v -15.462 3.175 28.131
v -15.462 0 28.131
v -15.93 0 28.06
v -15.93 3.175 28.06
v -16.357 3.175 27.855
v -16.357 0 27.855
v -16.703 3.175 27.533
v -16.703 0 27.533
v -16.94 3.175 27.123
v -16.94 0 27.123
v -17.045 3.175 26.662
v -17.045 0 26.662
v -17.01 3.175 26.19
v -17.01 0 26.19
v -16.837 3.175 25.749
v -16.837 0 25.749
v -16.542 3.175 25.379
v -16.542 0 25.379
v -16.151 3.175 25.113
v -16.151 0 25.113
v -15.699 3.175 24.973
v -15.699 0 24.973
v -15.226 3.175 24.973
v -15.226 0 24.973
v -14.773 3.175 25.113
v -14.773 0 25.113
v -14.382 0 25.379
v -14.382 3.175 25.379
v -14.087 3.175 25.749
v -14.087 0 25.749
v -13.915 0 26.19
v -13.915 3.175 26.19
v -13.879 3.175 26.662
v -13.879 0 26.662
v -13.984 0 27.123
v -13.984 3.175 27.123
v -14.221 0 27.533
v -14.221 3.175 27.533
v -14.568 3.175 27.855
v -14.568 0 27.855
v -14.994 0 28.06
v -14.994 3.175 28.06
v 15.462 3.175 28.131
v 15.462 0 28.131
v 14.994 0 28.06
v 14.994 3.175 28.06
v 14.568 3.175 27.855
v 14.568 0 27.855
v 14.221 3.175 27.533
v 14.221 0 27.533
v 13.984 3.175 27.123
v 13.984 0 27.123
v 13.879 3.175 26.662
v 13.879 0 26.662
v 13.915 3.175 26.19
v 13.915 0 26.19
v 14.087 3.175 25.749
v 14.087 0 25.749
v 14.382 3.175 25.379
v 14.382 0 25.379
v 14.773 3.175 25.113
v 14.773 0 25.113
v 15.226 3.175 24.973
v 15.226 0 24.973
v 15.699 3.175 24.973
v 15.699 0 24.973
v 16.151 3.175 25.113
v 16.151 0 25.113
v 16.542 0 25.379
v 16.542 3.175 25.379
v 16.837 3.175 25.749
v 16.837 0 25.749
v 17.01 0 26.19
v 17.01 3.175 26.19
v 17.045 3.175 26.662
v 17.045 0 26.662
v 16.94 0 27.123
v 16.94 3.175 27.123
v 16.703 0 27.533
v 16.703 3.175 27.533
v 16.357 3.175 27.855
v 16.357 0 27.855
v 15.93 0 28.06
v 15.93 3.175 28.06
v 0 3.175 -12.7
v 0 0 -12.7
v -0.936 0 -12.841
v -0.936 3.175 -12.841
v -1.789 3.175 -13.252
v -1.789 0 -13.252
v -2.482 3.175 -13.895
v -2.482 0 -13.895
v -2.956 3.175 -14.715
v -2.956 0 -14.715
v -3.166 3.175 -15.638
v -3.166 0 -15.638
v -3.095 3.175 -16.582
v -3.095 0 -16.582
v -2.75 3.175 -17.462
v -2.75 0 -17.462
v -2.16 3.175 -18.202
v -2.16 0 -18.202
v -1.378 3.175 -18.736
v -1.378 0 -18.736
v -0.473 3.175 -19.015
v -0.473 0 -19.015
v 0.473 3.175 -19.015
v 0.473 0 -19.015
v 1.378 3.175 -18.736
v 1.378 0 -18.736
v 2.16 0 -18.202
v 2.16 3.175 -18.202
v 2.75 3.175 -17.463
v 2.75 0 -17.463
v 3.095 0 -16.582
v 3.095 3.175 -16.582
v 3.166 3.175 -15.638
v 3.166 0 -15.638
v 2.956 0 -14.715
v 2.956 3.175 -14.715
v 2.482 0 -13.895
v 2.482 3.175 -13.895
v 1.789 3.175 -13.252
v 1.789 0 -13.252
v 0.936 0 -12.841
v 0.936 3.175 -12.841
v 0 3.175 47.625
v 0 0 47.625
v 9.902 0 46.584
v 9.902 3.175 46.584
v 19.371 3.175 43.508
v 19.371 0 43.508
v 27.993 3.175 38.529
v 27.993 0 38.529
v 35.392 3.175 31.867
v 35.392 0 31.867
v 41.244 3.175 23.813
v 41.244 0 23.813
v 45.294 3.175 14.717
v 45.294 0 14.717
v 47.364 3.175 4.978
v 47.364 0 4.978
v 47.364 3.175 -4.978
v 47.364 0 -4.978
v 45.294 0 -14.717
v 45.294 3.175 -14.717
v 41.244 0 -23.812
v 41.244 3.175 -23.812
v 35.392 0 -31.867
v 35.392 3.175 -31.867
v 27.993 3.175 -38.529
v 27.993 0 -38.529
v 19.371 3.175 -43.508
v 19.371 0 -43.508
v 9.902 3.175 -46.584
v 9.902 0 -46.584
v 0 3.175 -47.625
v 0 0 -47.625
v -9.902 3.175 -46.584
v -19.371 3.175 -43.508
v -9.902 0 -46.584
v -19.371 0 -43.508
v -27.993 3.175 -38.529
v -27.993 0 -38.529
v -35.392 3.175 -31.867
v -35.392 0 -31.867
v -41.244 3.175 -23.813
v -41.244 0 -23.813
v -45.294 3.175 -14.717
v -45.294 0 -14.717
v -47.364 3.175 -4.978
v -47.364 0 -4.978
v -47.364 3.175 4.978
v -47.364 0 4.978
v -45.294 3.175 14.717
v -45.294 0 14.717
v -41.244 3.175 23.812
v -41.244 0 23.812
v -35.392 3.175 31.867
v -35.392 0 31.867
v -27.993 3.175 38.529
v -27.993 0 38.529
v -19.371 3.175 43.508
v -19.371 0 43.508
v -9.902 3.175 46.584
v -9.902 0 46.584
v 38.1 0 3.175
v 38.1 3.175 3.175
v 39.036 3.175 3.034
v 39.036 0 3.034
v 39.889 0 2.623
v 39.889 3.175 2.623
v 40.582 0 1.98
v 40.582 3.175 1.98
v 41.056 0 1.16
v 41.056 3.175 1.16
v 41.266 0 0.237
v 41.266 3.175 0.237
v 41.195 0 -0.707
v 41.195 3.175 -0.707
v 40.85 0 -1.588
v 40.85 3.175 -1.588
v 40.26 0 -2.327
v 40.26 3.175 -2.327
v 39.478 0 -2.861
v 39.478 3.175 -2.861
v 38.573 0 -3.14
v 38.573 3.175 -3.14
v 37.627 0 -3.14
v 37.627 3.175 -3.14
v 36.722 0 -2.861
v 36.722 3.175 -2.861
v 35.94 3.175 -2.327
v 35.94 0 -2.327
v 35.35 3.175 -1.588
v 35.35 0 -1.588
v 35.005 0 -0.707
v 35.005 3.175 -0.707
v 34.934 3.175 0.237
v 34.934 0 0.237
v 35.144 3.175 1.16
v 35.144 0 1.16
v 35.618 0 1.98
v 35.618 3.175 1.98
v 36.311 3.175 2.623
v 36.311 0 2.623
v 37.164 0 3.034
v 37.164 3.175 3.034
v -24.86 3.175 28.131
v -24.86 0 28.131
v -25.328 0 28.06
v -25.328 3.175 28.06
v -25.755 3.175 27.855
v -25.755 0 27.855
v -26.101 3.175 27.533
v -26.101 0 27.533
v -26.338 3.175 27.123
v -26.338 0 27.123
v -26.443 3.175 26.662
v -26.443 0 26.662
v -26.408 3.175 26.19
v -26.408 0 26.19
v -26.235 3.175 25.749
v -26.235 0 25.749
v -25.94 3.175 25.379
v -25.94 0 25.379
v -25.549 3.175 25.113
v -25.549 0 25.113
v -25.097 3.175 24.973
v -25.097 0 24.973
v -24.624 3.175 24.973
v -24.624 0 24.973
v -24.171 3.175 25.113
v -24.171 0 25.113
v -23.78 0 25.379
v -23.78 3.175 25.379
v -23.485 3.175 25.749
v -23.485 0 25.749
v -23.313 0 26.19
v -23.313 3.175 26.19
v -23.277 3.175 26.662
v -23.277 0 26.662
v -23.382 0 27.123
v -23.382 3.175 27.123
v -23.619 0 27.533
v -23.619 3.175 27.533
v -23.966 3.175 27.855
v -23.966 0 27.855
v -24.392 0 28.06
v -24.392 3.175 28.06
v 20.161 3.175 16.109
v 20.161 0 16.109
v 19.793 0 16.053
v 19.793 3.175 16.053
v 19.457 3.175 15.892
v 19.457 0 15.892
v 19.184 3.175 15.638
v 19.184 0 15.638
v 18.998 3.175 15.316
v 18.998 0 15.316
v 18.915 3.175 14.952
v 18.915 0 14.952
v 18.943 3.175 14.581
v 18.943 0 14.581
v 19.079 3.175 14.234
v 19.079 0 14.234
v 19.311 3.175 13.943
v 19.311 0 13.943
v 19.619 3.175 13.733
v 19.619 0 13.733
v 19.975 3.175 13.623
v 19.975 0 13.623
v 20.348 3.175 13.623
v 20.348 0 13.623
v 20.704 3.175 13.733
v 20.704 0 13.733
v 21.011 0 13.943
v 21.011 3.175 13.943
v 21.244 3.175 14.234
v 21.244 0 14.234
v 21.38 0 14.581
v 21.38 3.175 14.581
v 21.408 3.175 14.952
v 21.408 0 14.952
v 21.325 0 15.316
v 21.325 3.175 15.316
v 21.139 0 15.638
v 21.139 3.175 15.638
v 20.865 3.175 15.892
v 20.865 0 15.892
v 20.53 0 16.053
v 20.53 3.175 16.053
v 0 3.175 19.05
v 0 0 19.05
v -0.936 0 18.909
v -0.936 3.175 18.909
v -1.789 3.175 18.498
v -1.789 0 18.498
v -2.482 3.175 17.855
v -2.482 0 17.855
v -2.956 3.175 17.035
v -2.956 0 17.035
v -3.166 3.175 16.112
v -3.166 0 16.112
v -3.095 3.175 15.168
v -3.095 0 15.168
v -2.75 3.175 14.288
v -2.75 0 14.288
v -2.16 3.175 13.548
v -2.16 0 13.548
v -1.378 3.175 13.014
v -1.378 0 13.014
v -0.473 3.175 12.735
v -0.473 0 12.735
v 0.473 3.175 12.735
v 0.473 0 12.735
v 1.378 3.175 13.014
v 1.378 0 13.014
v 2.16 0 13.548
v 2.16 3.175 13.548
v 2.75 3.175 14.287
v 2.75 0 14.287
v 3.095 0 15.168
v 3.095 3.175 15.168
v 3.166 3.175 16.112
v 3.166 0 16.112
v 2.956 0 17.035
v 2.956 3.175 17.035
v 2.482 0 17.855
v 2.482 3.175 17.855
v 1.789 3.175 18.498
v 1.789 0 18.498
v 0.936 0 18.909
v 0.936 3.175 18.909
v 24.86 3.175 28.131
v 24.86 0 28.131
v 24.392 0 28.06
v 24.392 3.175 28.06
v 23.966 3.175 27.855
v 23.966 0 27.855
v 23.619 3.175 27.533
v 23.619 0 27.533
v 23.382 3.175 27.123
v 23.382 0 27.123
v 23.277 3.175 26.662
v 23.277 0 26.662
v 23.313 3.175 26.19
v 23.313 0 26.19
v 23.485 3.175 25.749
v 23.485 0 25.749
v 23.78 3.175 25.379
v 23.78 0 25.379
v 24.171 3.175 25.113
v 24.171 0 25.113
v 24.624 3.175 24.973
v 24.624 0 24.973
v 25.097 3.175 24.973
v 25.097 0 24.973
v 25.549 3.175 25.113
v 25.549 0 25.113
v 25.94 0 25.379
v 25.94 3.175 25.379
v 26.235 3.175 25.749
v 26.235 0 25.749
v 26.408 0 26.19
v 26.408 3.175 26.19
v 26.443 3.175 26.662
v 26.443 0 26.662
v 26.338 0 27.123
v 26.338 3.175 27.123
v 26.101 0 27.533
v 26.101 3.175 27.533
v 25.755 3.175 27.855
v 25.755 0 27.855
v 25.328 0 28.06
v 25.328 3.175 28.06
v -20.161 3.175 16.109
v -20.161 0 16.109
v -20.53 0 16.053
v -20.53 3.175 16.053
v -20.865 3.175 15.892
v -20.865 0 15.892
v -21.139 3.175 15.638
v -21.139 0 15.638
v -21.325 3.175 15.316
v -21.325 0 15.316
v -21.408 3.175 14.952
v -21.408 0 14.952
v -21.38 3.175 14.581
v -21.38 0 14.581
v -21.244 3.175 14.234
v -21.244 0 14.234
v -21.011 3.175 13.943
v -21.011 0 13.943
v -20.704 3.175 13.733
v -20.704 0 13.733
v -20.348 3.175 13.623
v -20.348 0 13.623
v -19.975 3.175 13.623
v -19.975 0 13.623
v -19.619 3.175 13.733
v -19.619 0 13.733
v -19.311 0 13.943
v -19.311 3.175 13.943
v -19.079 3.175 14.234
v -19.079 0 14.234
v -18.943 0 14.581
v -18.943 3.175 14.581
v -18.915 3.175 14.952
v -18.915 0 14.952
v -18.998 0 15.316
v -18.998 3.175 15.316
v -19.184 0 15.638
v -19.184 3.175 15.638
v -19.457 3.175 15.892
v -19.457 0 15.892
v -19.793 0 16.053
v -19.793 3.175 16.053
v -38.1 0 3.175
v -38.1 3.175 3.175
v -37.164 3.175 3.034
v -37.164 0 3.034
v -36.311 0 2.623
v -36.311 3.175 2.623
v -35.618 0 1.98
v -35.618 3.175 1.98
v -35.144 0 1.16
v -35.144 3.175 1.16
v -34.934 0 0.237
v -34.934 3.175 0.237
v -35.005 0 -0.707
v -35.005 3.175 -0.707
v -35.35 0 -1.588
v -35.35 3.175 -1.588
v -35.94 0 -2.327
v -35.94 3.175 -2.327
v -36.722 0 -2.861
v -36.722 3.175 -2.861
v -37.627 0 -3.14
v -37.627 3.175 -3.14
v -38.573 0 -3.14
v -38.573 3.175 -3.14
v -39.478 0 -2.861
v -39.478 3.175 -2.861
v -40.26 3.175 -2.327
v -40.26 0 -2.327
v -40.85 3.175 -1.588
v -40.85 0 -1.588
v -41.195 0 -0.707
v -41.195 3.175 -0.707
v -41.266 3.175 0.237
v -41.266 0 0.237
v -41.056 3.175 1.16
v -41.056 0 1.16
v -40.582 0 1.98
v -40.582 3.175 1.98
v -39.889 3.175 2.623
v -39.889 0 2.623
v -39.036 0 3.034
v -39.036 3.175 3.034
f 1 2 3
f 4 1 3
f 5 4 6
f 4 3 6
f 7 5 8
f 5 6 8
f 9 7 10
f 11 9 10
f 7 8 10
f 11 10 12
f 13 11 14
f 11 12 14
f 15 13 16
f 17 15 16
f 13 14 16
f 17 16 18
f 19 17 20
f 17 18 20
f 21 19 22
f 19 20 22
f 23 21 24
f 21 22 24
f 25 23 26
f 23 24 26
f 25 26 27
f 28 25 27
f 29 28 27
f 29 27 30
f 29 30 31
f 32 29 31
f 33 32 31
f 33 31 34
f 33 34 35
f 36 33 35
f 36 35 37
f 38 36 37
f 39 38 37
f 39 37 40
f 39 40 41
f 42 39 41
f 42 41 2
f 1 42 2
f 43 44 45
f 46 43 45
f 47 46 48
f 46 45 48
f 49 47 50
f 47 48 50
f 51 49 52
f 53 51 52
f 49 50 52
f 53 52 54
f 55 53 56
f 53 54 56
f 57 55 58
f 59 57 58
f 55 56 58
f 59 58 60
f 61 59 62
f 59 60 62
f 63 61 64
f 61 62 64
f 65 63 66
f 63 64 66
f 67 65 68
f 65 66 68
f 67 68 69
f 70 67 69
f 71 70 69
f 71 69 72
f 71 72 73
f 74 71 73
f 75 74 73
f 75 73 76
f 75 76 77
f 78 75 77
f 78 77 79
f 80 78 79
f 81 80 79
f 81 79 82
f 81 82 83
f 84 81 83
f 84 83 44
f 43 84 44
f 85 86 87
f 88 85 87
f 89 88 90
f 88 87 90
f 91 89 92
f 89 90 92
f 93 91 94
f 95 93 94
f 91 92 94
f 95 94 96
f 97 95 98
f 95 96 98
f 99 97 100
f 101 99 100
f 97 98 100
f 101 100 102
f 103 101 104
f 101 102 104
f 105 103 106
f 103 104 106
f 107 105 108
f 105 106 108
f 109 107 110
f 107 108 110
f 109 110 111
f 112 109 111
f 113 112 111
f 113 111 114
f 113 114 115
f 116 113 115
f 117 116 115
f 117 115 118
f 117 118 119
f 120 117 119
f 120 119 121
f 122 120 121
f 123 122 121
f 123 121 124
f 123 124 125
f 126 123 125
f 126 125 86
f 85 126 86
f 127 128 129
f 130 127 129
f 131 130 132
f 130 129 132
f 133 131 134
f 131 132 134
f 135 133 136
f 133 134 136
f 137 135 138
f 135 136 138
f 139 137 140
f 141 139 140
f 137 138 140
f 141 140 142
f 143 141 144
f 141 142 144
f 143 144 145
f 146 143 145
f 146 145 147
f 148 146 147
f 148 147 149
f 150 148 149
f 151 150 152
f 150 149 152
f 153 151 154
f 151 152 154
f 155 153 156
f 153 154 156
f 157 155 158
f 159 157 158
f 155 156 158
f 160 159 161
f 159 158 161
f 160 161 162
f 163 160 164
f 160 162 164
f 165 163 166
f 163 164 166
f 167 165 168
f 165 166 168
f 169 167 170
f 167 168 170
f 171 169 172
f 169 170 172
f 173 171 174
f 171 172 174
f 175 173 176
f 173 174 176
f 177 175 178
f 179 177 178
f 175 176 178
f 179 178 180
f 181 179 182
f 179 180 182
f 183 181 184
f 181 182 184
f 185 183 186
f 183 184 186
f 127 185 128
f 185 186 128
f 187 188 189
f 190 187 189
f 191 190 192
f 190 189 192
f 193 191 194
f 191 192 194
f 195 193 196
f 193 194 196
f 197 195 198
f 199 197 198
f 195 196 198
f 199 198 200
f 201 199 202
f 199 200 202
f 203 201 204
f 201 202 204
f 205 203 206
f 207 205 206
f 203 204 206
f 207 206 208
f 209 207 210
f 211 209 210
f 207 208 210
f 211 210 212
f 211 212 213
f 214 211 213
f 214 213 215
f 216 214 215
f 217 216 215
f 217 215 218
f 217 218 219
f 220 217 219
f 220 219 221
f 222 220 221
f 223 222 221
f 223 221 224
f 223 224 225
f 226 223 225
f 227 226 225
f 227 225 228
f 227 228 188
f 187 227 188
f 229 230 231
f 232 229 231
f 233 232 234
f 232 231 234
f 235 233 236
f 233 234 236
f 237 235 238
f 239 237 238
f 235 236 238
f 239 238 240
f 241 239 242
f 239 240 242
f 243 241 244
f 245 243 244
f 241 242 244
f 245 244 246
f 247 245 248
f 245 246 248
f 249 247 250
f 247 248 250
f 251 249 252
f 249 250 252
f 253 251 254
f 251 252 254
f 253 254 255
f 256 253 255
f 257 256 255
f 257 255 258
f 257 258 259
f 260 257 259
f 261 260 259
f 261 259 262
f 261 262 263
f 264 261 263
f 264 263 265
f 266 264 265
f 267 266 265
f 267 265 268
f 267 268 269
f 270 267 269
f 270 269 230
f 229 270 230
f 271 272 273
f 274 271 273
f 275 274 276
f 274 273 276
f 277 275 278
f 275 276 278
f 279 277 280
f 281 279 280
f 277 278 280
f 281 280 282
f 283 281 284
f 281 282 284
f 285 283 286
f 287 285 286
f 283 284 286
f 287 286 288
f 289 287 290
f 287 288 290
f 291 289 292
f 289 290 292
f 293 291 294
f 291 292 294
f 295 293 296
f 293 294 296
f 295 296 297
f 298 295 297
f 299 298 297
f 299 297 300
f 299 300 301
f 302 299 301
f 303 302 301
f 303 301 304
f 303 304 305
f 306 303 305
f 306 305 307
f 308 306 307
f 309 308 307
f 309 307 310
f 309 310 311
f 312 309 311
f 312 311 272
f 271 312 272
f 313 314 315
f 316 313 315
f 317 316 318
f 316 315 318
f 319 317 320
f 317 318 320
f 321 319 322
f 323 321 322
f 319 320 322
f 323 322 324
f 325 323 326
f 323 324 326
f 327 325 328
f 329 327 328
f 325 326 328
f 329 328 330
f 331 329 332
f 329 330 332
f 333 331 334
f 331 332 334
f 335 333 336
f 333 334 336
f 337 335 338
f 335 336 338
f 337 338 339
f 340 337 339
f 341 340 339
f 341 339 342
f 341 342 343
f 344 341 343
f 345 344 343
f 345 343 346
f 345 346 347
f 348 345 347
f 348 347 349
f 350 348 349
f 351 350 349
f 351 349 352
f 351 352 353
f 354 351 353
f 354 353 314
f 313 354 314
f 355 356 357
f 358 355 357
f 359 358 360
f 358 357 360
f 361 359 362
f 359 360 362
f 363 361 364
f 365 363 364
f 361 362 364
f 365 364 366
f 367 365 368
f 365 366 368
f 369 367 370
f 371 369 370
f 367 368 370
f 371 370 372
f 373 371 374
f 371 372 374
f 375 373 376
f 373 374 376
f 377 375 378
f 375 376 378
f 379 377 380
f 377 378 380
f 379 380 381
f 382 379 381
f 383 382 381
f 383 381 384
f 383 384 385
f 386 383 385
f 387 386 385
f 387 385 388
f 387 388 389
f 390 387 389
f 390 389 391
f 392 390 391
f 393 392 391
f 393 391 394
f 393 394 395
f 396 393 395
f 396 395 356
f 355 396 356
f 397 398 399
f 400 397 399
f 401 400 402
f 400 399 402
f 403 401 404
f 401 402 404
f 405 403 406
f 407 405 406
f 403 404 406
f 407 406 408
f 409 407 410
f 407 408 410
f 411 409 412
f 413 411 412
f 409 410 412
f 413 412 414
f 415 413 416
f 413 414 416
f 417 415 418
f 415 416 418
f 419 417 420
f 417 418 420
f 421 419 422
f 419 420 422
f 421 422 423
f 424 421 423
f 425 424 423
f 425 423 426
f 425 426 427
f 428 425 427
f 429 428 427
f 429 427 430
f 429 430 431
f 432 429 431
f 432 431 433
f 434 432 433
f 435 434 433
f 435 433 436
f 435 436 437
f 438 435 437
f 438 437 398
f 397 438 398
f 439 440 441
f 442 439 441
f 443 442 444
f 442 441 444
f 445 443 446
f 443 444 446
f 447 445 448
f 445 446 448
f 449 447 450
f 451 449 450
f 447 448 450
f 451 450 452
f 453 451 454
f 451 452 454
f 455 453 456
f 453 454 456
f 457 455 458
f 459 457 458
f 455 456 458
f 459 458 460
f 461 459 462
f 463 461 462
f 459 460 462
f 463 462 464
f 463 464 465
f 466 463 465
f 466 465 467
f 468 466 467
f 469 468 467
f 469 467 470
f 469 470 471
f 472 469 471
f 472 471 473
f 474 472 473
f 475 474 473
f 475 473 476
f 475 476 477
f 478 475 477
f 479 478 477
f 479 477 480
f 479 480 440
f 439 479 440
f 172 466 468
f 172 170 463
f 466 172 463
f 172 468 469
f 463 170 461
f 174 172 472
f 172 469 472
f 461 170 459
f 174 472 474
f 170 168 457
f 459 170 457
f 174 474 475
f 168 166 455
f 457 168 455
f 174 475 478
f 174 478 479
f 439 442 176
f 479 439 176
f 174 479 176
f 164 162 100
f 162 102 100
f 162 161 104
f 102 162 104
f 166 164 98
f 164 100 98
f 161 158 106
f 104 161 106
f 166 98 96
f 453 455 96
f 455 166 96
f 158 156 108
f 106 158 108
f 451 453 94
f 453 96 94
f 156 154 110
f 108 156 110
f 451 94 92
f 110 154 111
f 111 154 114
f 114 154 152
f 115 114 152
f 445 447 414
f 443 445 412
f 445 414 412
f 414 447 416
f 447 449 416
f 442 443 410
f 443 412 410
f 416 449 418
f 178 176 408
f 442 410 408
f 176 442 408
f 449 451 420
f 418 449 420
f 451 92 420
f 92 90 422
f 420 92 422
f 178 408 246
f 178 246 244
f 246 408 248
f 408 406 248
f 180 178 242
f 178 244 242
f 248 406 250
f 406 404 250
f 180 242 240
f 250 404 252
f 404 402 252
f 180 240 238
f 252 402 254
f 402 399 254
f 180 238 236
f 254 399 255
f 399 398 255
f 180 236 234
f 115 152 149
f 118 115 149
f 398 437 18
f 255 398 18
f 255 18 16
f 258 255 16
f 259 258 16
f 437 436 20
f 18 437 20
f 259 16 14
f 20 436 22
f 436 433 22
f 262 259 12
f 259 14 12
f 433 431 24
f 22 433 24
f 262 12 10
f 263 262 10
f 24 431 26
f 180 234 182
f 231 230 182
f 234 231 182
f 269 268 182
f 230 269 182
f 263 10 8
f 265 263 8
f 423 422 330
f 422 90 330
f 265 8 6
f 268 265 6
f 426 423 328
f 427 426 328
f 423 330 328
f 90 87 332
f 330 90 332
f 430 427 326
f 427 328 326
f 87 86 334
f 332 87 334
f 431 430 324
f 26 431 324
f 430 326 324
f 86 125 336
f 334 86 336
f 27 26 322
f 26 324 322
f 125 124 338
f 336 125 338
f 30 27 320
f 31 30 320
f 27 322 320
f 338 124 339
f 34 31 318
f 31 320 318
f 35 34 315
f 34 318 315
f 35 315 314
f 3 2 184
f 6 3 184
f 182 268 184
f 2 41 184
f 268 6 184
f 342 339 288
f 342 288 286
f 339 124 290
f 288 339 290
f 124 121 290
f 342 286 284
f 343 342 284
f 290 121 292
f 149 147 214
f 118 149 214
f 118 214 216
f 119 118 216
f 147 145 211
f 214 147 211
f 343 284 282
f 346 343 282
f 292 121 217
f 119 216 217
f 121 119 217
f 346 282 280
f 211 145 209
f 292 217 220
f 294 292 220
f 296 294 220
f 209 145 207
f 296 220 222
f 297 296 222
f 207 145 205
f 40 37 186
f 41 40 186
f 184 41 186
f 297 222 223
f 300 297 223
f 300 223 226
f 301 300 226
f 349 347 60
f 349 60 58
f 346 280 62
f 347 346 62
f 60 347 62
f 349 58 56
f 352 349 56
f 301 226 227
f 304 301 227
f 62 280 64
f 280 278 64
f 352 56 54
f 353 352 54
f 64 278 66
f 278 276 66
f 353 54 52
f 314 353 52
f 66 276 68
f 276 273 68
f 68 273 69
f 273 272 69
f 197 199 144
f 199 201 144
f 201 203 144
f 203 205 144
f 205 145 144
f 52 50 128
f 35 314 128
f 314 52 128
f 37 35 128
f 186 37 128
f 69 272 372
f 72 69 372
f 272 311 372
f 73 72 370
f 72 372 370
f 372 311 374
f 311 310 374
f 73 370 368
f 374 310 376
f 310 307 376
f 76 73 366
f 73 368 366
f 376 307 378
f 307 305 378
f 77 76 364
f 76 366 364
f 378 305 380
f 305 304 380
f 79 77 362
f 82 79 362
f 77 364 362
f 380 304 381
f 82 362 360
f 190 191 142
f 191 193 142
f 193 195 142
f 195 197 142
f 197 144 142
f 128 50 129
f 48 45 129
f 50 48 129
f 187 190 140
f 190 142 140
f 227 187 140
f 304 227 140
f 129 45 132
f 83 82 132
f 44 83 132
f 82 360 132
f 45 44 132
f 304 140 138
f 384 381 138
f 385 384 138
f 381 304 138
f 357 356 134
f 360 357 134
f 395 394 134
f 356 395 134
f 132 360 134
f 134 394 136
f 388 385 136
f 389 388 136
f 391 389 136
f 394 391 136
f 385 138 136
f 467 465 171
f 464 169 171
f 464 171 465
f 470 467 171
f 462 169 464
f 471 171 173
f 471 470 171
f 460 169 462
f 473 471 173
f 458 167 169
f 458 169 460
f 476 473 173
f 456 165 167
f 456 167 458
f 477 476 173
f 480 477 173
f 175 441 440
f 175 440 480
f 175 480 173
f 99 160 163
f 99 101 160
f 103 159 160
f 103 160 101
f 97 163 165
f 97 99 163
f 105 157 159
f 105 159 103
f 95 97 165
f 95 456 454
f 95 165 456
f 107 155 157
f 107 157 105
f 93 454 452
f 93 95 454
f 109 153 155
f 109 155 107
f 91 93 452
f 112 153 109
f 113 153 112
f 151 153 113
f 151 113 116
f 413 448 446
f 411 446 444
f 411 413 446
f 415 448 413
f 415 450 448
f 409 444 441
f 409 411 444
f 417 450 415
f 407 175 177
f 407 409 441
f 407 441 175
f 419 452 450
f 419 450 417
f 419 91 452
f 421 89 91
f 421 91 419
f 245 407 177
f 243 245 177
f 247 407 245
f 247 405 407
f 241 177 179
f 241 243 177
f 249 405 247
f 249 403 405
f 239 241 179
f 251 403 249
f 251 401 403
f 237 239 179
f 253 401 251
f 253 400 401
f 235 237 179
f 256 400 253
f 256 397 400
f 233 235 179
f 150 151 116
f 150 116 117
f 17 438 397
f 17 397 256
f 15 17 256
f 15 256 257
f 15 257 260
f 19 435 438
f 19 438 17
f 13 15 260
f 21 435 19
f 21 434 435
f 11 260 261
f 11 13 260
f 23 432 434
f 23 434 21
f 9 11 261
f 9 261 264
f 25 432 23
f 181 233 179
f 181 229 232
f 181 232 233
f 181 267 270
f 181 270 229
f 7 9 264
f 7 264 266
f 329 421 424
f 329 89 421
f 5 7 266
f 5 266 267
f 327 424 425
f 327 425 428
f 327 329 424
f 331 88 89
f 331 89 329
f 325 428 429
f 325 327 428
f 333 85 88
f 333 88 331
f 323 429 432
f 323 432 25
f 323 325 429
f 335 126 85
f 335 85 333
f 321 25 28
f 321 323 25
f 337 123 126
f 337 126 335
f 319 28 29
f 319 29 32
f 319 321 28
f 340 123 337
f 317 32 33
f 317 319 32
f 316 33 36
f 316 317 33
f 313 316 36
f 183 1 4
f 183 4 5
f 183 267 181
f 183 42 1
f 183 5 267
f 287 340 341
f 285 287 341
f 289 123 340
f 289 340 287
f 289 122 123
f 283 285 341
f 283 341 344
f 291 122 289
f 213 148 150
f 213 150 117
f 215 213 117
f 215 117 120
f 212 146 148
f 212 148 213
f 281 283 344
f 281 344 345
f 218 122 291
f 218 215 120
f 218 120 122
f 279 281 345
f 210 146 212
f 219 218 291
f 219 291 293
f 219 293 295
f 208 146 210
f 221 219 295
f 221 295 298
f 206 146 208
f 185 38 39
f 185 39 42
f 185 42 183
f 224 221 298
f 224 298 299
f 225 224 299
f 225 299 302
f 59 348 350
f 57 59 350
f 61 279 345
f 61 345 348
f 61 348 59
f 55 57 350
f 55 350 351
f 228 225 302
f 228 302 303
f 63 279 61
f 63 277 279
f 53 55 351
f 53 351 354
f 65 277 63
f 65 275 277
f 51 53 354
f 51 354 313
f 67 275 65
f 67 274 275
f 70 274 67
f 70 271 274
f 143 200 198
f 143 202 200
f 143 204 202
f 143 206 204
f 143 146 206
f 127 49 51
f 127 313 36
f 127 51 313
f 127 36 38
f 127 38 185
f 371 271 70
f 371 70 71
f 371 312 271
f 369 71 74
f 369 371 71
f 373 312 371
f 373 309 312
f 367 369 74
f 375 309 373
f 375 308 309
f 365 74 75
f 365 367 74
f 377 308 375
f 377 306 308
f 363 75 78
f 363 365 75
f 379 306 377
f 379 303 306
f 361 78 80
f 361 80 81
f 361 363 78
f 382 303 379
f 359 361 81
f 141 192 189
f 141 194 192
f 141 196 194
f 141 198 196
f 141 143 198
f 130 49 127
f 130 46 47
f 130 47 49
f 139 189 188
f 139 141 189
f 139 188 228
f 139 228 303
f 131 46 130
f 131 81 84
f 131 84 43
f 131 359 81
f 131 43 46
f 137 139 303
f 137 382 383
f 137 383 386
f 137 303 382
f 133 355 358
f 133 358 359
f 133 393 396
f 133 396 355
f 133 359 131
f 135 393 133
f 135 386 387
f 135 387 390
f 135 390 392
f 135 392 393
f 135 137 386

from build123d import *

# Parameters (mm, degrees)
SKETCH1_R           = 47.625
BOSS_EXTRUDE1_DEPTH = 3.175
SKETCH2_R           = 3.175
CUT_EXTRUDE1_DEPTH  = 263.398
SKETCH3_R           = 3.175
CUT_EXTRUDE2_DEPTH  = 25.4
SKETCH4_R           = 1.5875
SKETCH4_R_2         = 1.25
CUT_EXTRUDE3_DEPTH  = 50.8


with BuildPart() as part:
    # Sketch1 → Boss-Extrude1 (new body)
    with BuildSketch(Plane(origin=(0, 0, 0), x_dir=(1, 0, 0), z_dir=(0, 1, 0))):
        with Locations(Location((0, 0, 0), (0, 0, 270))):
            Circle(SKETCH1_R)
    extrude(amount=BOSS_EXTRUDE1_DEPTH)

    # Sketch2 → Cut-Extrude1 (cut)
    with BuildSketch(Plane(origin=(-55.039702575, 231.775, -116.088398355), x_dir=(-1, 0, 0), z_dir=(0, 1, 0))):
        with Locations(Location((-93.139702575, 116.088398355, 0), (0, 0, 90))):
            Circle(SKETCH2_R)
        with Locations(Location((-16.939702575, 116.088398355, 0), (0, 0, 90))):
            Circle(SKETCH2_R)
    extrude(amount=-CUT_EXTRUDE1_DEPTH, mode=Mode.SUBTRACT)

    # Sketch3 → Cut-Extrude2 (cut)
    with BuildSketch(Plane(origin=(-28.264398128, -3.175, -82.371298873), x_dir=(1, 0, 0), z_dir=(0, -1, 0))):
        with Locations(Location((28.264398128, 98.246298873, 0), (0, 0, 90))):
            Circle(SKETCH3_R)
        with Locations(Location((28.264398128, 66.496298873, 0), (0, 0, 90))):
            Circle(SKETCH3_R)
    extrude(amount=-CUT_EXTRUDE2_DEPTH, mode=Mode.SUBTRACT)

    # Sketch4 → Cut-Extrude3 (cut)
    with BuildSketch(Plane(origin=(-28.264398128, -3.175, -82.371298873), x_dir=(-1, 0, 0), z_dir=(0, -1, 0))):
        with Locations(Location((-3.404148128, -108.914298873, 0), (0, 0, 270))):
            Circle(SKETCH4_R)
        with Locations(Location((-12.802148128, -108.914298873, 0), (0, 0, 270))):
            Circle(SKETCH4_R)
        with Locations(Location((-43.726648128, -108.914298873, 0), (0, 0, 270))):
            Circle(SKETCH4_R)
        with Locations(Location((-53.124648128, -108.914298873, 0), (0, 0, 270))):
            Circle(SKETCH4_R)
        with Locations(Location((-8.103148128, -97.230298873, 0), (0, 0, 270))):
            Circle(SKETCH4_R_2)
        with Locations(Location((-48.425648128, -97.230298873, 0), (0, 0, 270))):
            Circle(SKETCH4_R_2)
    extrude(amount=-CUT_EXTRUDE3_DEPTH, mode=Mode.SUBTRACT)


solid = part.part
